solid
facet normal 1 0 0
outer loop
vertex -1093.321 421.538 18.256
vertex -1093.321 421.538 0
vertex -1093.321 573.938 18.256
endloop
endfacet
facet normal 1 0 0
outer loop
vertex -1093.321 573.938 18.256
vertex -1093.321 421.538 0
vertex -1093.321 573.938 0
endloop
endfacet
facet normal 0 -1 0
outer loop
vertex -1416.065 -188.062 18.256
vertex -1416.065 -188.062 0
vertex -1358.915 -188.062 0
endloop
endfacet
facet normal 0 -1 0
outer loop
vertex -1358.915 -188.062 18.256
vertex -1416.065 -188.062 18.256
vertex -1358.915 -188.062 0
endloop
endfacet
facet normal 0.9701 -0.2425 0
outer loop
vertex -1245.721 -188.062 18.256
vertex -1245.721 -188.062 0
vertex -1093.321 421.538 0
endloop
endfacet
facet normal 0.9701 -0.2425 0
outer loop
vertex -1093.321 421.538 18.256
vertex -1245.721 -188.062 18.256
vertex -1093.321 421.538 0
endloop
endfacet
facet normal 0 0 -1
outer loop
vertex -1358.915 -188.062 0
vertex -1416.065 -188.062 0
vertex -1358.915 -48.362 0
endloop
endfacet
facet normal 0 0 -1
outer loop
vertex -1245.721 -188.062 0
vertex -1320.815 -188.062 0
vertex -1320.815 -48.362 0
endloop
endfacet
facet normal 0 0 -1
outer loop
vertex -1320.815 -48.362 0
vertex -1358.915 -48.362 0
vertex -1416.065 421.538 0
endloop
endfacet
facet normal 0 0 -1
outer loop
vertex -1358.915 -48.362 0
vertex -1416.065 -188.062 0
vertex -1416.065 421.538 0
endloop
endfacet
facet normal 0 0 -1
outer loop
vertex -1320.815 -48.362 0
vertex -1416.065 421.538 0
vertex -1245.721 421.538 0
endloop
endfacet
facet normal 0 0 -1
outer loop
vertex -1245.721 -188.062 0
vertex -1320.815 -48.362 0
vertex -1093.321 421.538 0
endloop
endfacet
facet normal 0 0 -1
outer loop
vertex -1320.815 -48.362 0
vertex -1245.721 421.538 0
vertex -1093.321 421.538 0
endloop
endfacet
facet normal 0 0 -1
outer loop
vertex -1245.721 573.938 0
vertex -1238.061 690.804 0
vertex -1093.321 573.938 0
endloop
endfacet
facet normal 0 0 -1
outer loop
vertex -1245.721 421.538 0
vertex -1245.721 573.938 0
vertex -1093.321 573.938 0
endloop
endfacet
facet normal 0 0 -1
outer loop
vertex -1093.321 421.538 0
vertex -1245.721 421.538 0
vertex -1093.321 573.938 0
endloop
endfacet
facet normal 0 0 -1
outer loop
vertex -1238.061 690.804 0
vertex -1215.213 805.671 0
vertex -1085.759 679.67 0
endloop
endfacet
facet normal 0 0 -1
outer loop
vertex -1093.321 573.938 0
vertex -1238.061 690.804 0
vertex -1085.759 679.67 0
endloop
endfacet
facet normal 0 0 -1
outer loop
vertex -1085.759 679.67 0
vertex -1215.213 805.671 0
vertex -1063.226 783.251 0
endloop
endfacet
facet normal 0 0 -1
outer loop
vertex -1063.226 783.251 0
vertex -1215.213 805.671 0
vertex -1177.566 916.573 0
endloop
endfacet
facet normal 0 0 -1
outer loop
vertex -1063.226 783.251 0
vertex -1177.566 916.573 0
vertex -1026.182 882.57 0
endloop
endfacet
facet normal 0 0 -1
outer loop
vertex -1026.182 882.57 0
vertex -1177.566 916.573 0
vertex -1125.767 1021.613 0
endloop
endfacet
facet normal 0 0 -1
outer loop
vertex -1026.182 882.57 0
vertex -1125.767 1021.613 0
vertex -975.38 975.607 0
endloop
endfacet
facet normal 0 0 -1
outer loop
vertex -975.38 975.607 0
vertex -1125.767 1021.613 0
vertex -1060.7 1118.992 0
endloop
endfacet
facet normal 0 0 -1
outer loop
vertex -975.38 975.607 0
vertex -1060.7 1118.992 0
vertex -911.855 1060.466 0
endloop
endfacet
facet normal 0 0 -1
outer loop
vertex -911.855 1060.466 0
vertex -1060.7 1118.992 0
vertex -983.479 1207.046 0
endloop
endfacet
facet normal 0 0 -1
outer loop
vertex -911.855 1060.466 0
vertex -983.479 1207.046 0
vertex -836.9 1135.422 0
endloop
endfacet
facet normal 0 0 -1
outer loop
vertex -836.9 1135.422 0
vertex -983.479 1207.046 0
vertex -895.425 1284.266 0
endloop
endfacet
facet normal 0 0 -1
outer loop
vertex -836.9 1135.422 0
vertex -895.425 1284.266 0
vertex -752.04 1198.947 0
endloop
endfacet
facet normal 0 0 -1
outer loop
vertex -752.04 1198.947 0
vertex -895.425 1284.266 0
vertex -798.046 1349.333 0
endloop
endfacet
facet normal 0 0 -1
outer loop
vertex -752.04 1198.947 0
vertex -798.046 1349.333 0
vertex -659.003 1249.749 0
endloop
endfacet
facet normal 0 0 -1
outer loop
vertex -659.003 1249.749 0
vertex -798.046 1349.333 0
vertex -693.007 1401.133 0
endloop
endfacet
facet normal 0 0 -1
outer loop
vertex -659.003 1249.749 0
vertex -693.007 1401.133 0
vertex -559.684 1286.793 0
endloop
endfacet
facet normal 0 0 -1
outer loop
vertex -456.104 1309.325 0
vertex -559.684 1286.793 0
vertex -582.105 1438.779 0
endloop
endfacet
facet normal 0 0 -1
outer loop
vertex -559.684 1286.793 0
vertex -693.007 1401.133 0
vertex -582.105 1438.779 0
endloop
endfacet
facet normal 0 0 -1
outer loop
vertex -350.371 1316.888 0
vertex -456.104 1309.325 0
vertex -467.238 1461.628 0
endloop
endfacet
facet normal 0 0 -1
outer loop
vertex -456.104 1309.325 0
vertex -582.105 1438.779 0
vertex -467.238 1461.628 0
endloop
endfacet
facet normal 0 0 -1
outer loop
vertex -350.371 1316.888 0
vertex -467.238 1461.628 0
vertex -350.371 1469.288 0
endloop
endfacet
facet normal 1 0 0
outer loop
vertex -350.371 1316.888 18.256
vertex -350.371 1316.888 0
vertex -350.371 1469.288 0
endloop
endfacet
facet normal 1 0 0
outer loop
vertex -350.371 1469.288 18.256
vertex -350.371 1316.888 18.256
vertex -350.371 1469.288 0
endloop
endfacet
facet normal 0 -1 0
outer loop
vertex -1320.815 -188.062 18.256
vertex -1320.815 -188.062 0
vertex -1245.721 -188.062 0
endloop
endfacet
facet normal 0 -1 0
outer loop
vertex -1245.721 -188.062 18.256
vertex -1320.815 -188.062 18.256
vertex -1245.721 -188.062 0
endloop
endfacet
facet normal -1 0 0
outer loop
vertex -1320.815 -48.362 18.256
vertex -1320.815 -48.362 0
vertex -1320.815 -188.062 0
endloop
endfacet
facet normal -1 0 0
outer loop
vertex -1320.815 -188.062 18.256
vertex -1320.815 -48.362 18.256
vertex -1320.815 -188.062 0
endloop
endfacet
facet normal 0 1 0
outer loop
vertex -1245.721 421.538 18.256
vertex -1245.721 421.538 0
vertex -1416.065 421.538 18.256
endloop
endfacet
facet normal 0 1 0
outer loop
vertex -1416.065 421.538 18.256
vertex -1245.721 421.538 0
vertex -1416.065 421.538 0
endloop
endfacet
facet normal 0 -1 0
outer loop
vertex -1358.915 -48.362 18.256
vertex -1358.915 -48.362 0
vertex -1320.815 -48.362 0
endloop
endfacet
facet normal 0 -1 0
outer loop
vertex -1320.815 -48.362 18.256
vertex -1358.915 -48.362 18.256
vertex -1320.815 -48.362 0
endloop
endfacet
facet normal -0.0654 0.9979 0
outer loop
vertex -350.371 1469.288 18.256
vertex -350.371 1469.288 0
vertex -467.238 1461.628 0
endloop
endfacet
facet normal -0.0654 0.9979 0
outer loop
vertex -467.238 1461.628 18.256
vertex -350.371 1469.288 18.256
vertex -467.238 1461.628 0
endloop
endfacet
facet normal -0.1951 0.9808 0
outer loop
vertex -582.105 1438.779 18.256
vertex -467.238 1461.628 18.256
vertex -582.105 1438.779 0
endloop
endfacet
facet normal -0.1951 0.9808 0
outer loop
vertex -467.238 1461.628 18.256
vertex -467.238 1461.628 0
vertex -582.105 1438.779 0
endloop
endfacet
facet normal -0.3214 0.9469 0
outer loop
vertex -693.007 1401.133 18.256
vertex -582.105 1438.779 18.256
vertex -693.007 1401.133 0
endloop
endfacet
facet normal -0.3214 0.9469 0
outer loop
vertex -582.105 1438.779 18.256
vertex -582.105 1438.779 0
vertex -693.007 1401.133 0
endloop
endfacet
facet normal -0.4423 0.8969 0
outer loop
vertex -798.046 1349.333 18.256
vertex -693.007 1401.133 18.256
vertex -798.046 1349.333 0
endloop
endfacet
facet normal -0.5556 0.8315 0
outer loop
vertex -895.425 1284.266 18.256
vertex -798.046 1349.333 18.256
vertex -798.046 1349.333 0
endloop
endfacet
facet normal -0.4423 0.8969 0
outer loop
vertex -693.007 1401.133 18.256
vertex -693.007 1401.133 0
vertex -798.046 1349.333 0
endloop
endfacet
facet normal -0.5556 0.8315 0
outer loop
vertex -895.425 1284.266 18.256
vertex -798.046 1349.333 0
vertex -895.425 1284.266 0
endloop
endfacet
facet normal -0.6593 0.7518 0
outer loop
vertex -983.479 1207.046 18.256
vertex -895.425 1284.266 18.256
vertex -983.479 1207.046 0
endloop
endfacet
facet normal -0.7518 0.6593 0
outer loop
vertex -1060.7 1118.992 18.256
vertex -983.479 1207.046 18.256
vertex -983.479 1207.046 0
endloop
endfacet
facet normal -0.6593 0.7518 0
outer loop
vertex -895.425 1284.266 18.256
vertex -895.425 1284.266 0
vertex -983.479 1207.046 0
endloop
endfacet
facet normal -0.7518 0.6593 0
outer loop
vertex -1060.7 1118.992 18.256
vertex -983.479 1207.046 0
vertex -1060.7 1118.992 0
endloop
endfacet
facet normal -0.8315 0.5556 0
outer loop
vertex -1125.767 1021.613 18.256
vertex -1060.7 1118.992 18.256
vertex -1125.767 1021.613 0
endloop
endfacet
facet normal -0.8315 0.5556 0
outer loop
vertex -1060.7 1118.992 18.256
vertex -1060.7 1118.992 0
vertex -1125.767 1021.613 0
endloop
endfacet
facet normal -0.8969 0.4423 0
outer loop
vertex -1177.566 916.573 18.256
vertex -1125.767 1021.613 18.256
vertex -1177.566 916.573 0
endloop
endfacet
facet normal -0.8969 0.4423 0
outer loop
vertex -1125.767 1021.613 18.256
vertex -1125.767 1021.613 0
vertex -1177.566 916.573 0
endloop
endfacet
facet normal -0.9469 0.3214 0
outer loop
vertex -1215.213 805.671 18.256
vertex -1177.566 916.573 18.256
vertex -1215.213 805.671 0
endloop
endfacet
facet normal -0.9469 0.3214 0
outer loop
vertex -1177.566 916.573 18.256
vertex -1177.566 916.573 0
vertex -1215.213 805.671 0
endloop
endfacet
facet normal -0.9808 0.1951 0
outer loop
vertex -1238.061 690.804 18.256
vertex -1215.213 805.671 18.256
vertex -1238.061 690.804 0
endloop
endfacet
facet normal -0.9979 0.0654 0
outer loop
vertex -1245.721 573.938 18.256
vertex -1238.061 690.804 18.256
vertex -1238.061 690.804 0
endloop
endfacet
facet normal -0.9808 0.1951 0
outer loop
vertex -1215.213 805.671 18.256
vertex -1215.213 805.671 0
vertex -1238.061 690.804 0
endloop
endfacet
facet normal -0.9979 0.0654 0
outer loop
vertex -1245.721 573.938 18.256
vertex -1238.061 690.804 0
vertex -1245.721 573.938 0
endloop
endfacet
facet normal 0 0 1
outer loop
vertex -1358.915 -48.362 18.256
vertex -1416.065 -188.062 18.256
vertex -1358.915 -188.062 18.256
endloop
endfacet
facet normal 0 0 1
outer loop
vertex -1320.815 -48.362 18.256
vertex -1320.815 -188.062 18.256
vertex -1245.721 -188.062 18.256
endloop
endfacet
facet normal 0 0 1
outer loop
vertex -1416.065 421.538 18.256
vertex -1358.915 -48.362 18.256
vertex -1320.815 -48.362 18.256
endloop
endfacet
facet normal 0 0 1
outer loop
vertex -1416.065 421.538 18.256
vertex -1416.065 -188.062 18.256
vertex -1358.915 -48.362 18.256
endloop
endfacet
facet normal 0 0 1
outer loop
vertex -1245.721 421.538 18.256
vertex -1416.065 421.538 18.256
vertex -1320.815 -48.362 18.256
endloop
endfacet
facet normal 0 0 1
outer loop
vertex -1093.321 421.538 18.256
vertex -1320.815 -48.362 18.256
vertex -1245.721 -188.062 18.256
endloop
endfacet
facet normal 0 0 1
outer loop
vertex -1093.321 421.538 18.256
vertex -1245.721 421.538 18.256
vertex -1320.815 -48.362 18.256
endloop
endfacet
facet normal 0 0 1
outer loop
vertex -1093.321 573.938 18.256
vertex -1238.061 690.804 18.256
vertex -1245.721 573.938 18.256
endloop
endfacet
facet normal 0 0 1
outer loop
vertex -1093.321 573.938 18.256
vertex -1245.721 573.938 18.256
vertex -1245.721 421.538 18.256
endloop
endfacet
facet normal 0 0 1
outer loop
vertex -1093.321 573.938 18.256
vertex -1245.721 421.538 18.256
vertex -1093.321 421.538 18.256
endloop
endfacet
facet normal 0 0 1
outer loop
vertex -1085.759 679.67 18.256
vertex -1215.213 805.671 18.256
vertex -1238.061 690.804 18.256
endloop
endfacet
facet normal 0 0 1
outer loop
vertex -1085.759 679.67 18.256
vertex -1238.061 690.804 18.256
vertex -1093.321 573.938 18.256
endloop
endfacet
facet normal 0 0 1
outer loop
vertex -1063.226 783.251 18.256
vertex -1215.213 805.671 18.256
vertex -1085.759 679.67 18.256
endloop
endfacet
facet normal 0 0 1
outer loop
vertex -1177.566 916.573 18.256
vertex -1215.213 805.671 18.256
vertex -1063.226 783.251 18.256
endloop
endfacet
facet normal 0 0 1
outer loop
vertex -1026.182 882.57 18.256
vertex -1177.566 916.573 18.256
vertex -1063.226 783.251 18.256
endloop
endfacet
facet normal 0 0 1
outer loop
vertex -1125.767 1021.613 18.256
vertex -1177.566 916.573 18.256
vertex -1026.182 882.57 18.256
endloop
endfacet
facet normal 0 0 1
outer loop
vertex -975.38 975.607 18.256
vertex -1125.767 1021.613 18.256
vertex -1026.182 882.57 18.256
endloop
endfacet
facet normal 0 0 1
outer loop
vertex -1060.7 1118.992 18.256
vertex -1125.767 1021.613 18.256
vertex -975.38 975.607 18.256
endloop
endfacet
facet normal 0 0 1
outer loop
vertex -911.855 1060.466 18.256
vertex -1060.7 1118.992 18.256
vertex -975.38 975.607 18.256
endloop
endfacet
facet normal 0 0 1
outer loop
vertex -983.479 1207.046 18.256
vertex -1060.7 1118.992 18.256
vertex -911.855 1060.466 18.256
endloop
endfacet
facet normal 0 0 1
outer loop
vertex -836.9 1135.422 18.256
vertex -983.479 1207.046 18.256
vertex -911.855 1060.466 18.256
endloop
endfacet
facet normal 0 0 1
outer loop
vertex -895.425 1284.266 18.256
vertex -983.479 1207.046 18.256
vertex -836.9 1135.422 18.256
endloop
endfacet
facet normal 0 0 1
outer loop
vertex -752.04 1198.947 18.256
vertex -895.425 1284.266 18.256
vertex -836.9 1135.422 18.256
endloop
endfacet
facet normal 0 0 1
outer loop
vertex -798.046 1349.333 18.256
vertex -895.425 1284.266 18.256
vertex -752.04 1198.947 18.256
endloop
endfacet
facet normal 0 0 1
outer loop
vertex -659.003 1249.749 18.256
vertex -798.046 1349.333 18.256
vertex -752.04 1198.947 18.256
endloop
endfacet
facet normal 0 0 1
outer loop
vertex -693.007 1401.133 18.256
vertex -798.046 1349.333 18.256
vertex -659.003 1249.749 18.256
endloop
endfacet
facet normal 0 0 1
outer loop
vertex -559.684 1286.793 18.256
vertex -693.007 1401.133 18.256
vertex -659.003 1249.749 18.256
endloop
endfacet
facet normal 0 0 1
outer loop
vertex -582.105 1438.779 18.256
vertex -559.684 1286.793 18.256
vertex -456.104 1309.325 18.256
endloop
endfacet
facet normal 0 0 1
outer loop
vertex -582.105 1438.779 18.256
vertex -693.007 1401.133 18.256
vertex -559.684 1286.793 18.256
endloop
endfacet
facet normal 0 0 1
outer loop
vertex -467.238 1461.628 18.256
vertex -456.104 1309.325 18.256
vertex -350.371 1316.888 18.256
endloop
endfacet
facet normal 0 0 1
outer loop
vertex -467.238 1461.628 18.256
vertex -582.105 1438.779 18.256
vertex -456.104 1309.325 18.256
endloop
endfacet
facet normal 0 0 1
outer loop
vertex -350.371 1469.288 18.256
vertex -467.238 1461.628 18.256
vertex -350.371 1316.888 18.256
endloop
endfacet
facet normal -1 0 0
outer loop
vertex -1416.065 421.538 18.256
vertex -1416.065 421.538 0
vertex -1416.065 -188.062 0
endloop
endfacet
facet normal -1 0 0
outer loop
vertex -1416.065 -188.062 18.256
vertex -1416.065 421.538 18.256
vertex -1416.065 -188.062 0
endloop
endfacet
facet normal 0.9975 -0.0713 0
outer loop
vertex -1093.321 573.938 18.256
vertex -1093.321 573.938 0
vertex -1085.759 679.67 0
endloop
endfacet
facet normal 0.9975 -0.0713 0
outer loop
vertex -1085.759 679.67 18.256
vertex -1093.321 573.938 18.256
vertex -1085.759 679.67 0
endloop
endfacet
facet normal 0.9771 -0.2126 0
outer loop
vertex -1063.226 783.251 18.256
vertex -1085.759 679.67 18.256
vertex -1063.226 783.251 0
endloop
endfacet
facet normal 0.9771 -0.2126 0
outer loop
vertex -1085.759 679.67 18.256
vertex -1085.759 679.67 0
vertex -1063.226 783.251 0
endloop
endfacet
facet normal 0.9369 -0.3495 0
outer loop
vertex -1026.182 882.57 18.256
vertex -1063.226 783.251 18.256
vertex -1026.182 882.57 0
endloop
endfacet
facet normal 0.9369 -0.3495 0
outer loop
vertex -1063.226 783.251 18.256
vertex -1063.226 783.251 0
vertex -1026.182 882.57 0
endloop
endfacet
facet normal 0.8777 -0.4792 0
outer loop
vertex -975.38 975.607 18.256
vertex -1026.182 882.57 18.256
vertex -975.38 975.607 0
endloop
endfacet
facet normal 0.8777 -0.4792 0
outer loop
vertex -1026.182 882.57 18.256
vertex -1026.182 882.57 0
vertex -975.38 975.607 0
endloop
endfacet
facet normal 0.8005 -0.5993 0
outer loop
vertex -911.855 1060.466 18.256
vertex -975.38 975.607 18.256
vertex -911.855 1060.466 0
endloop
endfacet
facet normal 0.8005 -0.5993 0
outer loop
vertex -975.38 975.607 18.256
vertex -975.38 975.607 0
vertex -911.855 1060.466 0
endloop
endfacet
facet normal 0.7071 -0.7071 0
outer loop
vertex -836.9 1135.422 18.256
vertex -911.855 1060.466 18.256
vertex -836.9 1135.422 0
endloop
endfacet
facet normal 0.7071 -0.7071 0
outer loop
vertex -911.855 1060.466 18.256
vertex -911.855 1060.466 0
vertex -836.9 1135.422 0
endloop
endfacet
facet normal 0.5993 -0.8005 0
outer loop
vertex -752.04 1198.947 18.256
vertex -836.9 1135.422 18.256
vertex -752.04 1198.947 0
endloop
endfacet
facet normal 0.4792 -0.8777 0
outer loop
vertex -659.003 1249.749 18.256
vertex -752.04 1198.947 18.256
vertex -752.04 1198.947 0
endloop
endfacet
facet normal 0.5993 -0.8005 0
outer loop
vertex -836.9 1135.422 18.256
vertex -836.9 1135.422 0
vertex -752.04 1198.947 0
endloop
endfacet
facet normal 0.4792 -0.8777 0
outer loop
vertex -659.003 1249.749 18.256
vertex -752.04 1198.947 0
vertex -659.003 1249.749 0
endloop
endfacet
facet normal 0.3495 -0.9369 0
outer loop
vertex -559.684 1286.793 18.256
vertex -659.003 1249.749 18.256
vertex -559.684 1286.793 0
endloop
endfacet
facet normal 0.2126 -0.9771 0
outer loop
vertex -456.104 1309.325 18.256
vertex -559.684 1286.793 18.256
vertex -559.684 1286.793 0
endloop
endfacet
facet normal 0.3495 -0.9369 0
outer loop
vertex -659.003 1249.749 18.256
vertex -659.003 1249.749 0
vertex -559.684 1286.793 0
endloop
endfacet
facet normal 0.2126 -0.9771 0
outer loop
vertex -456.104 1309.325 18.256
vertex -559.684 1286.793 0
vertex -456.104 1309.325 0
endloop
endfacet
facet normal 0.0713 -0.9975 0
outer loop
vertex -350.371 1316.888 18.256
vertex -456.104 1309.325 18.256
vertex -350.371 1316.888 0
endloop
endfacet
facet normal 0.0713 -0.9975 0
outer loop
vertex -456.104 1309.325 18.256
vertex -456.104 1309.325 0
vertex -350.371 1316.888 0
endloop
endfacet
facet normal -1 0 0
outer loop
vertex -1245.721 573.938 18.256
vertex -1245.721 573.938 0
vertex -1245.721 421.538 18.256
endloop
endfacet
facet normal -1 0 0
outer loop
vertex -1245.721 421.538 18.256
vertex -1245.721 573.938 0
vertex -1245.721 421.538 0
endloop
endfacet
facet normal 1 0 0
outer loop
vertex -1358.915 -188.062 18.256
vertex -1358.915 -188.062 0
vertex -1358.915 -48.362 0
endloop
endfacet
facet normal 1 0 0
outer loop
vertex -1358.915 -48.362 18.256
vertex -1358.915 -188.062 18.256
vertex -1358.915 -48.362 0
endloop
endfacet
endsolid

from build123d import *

# Parameters (mm, degrees)
BOSS_EXTRUDE1_DEPTH = 18.25625


with BuildPart() as part:
    # Sketch1 → Boss-Extrude1 (new body)
    with BuildSketch(Plane.XY):
        with BuildLine():
            Line((-1416.065070695, 421.537507263), (-1416.065070695, -188.062492737))
            Line((-1416.065070695, -188.062492737), (-1358.915070695, -188.062492737))
            Line((-1358.915070695, -188.062492737), (-1358.915070695, -48.362492737))
            Line((-1358.915070695, -48.362492737), (-1320.815070695, -48.362492737))
            Line((-1320.815070695, -48.362492737), (-1320.815070695, -188.062492737))
            Line((-1320.815070695, -188.062492737), (-1245.720896666, -188.062492737))
            Line((-1245.720896666, -188.062492737), (-1093.320896666, 421.537507263))
            Line((-1093.320896666, 421.537507263), (-1093.320896666, 573.937507263))
            ThreePointArc((-1093.320896666, 573.937507263), (-875.715879749, 1099.282490346), (-350.370896666, 1316.887507263))
            Line((-350.370896666, 1316.887507263), (-350.370896666, 1469.287507263))
            ThreePointArc((-350.370896666, 1469.287507263), (-983.478953202, 1207.045563799), (-1245.720896666, 573.937507263))
            Line((-1245.720896666, 573.937507263), (-1245.720896666, 421.537507263))
            Line((-1245.720896666, 421.537507263), (-1416.065070695, 421.537507263))
        make_face()
    extrude(amount=BOSS_EXTRUDE1_DEPTH)


solid = part.part
